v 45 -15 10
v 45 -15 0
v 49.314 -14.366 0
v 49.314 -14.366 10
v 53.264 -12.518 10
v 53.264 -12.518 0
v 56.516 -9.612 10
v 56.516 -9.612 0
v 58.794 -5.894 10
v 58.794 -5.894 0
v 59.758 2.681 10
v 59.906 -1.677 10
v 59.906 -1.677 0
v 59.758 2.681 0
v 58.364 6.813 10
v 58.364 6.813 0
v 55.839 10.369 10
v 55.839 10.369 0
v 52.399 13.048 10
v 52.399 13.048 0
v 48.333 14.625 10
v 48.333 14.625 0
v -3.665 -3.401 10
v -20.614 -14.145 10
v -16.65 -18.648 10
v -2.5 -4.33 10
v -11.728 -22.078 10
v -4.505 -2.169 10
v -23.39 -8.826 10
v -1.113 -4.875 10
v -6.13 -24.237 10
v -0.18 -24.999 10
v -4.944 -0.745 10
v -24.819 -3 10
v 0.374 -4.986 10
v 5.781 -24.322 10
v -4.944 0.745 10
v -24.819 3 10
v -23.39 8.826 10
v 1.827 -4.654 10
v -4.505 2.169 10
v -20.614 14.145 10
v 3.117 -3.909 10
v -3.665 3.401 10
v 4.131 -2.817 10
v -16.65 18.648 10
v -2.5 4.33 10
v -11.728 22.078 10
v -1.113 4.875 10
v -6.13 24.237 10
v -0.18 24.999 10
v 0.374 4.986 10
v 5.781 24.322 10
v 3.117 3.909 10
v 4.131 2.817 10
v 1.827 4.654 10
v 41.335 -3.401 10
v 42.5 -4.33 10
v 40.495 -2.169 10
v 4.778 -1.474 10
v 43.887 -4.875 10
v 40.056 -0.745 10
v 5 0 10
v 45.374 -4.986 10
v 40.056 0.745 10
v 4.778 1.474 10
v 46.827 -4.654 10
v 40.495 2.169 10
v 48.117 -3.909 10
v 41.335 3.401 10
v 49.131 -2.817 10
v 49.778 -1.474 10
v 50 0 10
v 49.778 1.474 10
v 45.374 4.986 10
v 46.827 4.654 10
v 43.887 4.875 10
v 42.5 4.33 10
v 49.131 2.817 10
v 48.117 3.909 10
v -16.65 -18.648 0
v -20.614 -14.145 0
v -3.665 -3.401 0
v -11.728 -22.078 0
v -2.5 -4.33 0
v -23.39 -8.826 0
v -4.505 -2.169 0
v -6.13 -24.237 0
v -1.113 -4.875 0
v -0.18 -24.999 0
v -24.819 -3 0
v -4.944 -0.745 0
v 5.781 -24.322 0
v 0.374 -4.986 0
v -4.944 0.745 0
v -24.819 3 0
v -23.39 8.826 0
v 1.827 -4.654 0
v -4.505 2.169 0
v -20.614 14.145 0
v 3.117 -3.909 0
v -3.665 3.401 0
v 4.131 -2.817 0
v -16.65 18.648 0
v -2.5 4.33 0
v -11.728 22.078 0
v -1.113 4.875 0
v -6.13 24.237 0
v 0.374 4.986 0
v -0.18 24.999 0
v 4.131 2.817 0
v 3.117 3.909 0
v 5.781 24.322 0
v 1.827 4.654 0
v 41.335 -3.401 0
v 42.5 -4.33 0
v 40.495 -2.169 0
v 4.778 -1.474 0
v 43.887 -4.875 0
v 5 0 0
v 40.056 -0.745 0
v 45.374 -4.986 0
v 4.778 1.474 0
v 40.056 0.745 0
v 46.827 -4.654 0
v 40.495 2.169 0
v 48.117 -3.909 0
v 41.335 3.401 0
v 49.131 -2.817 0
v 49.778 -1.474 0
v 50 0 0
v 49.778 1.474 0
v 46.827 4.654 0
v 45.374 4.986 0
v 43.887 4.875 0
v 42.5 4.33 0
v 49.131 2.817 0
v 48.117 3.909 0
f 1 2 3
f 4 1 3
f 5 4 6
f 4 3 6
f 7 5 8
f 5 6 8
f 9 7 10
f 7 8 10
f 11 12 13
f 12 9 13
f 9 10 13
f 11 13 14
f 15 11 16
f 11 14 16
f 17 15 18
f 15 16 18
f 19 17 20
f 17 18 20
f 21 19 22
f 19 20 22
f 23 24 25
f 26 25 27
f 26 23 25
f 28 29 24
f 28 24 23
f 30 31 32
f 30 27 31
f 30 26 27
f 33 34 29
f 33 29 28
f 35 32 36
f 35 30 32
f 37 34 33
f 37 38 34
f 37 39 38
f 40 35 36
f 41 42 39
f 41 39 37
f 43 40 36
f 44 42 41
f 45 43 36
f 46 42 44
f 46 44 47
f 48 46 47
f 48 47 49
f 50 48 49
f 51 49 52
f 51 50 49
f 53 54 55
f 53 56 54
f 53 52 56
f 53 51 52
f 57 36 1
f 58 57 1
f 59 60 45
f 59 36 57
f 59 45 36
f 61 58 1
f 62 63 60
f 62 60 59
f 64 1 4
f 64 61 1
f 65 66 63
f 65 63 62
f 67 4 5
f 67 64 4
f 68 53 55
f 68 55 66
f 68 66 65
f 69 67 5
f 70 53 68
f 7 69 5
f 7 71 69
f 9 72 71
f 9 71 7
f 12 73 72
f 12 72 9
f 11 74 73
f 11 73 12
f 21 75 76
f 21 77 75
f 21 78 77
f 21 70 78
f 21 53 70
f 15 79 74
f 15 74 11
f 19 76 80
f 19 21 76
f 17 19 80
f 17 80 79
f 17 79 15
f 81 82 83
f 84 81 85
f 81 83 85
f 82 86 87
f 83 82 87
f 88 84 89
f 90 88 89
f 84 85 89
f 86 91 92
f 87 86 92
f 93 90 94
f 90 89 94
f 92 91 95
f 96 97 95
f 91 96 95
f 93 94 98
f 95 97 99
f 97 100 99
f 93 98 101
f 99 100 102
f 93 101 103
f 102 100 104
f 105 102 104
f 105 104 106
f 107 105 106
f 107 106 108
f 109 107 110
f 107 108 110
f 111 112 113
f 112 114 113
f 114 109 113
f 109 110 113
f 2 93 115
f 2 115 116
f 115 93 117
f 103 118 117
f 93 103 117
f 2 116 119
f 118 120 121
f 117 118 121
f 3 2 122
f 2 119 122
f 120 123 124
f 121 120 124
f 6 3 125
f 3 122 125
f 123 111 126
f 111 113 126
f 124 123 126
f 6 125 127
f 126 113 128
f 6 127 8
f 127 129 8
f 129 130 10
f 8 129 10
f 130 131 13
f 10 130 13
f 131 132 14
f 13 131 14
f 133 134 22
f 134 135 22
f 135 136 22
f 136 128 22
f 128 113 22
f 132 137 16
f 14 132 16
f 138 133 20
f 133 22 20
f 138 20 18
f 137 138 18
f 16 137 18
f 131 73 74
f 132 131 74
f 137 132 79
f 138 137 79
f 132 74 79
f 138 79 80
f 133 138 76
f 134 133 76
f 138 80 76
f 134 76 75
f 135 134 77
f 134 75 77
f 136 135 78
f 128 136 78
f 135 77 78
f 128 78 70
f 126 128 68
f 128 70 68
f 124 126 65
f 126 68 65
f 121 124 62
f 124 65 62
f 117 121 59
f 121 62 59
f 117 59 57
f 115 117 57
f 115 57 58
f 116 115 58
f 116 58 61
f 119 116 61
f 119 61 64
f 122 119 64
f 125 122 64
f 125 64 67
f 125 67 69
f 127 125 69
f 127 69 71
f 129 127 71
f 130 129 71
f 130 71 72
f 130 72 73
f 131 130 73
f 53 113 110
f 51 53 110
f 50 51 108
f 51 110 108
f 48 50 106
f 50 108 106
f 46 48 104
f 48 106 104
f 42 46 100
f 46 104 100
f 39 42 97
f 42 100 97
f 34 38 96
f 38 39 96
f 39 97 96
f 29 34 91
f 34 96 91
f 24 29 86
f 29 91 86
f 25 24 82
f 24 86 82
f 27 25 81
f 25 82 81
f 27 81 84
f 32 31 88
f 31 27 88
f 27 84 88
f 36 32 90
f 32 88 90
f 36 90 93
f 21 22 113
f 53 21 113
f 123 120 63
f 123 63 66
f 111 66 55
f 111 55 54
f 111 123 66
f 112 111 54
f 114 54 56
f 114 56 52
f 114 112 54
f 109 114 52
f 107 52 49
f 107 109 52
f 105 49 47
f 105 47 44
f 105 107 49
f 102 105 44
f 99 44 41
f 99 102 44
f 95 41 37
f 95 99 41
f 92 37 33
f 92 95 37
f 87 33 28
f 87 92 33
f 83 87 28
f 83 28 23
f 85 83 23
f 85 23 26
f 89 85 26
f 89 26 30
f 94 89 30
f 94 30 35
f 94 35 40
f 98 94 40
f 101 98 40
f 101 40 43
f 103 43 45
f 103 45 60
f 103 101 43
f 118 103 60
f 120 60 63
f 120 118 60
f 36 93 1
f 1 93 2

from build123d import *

# Parameters (mm, degrees)
SKETCH2_R           = 60
SKETCH2_R_2         = 5
BOSS_EXTRUDE1_DEPTH = 10
SKETCH3_R           = 5
CUT_EXTRUDE1_DEPTH  = 32
SKETCH4_R           = 81.078971207
CUT_EXTRUDE2_DEPTH  = 130


with BuildPart() as part:
    # Sketch2 → Boss-Extrude1 (new body)
    with BuildSketch(Plane.XY):
        Circle(SKETCH2_R)
        Circle(SKETCH2_R_2, mode=Mode.SUBTRACT)
    extrude(amount=BOSS_EXTRUDE1_DEPTH)

    # Sketch3 → Cut-Extrude1 (cut)
    with BuildSketch(Plane.XY.offset(10)):
        with Locations((45, 0)):
            Circle(SKETCH3_R)
    extrude(amount=-CUT_EXTRUDE1_DEPTH, mode=Mode.SUBTRACT)

    # Sketch4 → Cut-Extrude2 (cut)
    with BuildSketch(Plane(origin=(0, 0, 0), x_dir=(-1, 0, 0), z_dir=(0, 0, -1))):
        Circle(SKETCH4_R)
        with BuildLine():
            Line((-5.781451877, -24.322311037), (-45, -15))
            ThreePointArc((-45, -15), (-59.905960926, -1.676999964), (-48.332972793, 14.625022816))
            Line((-48.332972793, 14.625022816), (-5.781451877, 24.322311037))
            ThreePointArc((-5.781451877, 24.322311037), (25, 0), (-5.781451877, -24.322311037))
        make_face(mode=Mode.SUBTRACT)
    extrude(amount=-CUT_EXTRUDE2_DEPTH, mode=Mode.SUBTRACT)


solid = part.part
